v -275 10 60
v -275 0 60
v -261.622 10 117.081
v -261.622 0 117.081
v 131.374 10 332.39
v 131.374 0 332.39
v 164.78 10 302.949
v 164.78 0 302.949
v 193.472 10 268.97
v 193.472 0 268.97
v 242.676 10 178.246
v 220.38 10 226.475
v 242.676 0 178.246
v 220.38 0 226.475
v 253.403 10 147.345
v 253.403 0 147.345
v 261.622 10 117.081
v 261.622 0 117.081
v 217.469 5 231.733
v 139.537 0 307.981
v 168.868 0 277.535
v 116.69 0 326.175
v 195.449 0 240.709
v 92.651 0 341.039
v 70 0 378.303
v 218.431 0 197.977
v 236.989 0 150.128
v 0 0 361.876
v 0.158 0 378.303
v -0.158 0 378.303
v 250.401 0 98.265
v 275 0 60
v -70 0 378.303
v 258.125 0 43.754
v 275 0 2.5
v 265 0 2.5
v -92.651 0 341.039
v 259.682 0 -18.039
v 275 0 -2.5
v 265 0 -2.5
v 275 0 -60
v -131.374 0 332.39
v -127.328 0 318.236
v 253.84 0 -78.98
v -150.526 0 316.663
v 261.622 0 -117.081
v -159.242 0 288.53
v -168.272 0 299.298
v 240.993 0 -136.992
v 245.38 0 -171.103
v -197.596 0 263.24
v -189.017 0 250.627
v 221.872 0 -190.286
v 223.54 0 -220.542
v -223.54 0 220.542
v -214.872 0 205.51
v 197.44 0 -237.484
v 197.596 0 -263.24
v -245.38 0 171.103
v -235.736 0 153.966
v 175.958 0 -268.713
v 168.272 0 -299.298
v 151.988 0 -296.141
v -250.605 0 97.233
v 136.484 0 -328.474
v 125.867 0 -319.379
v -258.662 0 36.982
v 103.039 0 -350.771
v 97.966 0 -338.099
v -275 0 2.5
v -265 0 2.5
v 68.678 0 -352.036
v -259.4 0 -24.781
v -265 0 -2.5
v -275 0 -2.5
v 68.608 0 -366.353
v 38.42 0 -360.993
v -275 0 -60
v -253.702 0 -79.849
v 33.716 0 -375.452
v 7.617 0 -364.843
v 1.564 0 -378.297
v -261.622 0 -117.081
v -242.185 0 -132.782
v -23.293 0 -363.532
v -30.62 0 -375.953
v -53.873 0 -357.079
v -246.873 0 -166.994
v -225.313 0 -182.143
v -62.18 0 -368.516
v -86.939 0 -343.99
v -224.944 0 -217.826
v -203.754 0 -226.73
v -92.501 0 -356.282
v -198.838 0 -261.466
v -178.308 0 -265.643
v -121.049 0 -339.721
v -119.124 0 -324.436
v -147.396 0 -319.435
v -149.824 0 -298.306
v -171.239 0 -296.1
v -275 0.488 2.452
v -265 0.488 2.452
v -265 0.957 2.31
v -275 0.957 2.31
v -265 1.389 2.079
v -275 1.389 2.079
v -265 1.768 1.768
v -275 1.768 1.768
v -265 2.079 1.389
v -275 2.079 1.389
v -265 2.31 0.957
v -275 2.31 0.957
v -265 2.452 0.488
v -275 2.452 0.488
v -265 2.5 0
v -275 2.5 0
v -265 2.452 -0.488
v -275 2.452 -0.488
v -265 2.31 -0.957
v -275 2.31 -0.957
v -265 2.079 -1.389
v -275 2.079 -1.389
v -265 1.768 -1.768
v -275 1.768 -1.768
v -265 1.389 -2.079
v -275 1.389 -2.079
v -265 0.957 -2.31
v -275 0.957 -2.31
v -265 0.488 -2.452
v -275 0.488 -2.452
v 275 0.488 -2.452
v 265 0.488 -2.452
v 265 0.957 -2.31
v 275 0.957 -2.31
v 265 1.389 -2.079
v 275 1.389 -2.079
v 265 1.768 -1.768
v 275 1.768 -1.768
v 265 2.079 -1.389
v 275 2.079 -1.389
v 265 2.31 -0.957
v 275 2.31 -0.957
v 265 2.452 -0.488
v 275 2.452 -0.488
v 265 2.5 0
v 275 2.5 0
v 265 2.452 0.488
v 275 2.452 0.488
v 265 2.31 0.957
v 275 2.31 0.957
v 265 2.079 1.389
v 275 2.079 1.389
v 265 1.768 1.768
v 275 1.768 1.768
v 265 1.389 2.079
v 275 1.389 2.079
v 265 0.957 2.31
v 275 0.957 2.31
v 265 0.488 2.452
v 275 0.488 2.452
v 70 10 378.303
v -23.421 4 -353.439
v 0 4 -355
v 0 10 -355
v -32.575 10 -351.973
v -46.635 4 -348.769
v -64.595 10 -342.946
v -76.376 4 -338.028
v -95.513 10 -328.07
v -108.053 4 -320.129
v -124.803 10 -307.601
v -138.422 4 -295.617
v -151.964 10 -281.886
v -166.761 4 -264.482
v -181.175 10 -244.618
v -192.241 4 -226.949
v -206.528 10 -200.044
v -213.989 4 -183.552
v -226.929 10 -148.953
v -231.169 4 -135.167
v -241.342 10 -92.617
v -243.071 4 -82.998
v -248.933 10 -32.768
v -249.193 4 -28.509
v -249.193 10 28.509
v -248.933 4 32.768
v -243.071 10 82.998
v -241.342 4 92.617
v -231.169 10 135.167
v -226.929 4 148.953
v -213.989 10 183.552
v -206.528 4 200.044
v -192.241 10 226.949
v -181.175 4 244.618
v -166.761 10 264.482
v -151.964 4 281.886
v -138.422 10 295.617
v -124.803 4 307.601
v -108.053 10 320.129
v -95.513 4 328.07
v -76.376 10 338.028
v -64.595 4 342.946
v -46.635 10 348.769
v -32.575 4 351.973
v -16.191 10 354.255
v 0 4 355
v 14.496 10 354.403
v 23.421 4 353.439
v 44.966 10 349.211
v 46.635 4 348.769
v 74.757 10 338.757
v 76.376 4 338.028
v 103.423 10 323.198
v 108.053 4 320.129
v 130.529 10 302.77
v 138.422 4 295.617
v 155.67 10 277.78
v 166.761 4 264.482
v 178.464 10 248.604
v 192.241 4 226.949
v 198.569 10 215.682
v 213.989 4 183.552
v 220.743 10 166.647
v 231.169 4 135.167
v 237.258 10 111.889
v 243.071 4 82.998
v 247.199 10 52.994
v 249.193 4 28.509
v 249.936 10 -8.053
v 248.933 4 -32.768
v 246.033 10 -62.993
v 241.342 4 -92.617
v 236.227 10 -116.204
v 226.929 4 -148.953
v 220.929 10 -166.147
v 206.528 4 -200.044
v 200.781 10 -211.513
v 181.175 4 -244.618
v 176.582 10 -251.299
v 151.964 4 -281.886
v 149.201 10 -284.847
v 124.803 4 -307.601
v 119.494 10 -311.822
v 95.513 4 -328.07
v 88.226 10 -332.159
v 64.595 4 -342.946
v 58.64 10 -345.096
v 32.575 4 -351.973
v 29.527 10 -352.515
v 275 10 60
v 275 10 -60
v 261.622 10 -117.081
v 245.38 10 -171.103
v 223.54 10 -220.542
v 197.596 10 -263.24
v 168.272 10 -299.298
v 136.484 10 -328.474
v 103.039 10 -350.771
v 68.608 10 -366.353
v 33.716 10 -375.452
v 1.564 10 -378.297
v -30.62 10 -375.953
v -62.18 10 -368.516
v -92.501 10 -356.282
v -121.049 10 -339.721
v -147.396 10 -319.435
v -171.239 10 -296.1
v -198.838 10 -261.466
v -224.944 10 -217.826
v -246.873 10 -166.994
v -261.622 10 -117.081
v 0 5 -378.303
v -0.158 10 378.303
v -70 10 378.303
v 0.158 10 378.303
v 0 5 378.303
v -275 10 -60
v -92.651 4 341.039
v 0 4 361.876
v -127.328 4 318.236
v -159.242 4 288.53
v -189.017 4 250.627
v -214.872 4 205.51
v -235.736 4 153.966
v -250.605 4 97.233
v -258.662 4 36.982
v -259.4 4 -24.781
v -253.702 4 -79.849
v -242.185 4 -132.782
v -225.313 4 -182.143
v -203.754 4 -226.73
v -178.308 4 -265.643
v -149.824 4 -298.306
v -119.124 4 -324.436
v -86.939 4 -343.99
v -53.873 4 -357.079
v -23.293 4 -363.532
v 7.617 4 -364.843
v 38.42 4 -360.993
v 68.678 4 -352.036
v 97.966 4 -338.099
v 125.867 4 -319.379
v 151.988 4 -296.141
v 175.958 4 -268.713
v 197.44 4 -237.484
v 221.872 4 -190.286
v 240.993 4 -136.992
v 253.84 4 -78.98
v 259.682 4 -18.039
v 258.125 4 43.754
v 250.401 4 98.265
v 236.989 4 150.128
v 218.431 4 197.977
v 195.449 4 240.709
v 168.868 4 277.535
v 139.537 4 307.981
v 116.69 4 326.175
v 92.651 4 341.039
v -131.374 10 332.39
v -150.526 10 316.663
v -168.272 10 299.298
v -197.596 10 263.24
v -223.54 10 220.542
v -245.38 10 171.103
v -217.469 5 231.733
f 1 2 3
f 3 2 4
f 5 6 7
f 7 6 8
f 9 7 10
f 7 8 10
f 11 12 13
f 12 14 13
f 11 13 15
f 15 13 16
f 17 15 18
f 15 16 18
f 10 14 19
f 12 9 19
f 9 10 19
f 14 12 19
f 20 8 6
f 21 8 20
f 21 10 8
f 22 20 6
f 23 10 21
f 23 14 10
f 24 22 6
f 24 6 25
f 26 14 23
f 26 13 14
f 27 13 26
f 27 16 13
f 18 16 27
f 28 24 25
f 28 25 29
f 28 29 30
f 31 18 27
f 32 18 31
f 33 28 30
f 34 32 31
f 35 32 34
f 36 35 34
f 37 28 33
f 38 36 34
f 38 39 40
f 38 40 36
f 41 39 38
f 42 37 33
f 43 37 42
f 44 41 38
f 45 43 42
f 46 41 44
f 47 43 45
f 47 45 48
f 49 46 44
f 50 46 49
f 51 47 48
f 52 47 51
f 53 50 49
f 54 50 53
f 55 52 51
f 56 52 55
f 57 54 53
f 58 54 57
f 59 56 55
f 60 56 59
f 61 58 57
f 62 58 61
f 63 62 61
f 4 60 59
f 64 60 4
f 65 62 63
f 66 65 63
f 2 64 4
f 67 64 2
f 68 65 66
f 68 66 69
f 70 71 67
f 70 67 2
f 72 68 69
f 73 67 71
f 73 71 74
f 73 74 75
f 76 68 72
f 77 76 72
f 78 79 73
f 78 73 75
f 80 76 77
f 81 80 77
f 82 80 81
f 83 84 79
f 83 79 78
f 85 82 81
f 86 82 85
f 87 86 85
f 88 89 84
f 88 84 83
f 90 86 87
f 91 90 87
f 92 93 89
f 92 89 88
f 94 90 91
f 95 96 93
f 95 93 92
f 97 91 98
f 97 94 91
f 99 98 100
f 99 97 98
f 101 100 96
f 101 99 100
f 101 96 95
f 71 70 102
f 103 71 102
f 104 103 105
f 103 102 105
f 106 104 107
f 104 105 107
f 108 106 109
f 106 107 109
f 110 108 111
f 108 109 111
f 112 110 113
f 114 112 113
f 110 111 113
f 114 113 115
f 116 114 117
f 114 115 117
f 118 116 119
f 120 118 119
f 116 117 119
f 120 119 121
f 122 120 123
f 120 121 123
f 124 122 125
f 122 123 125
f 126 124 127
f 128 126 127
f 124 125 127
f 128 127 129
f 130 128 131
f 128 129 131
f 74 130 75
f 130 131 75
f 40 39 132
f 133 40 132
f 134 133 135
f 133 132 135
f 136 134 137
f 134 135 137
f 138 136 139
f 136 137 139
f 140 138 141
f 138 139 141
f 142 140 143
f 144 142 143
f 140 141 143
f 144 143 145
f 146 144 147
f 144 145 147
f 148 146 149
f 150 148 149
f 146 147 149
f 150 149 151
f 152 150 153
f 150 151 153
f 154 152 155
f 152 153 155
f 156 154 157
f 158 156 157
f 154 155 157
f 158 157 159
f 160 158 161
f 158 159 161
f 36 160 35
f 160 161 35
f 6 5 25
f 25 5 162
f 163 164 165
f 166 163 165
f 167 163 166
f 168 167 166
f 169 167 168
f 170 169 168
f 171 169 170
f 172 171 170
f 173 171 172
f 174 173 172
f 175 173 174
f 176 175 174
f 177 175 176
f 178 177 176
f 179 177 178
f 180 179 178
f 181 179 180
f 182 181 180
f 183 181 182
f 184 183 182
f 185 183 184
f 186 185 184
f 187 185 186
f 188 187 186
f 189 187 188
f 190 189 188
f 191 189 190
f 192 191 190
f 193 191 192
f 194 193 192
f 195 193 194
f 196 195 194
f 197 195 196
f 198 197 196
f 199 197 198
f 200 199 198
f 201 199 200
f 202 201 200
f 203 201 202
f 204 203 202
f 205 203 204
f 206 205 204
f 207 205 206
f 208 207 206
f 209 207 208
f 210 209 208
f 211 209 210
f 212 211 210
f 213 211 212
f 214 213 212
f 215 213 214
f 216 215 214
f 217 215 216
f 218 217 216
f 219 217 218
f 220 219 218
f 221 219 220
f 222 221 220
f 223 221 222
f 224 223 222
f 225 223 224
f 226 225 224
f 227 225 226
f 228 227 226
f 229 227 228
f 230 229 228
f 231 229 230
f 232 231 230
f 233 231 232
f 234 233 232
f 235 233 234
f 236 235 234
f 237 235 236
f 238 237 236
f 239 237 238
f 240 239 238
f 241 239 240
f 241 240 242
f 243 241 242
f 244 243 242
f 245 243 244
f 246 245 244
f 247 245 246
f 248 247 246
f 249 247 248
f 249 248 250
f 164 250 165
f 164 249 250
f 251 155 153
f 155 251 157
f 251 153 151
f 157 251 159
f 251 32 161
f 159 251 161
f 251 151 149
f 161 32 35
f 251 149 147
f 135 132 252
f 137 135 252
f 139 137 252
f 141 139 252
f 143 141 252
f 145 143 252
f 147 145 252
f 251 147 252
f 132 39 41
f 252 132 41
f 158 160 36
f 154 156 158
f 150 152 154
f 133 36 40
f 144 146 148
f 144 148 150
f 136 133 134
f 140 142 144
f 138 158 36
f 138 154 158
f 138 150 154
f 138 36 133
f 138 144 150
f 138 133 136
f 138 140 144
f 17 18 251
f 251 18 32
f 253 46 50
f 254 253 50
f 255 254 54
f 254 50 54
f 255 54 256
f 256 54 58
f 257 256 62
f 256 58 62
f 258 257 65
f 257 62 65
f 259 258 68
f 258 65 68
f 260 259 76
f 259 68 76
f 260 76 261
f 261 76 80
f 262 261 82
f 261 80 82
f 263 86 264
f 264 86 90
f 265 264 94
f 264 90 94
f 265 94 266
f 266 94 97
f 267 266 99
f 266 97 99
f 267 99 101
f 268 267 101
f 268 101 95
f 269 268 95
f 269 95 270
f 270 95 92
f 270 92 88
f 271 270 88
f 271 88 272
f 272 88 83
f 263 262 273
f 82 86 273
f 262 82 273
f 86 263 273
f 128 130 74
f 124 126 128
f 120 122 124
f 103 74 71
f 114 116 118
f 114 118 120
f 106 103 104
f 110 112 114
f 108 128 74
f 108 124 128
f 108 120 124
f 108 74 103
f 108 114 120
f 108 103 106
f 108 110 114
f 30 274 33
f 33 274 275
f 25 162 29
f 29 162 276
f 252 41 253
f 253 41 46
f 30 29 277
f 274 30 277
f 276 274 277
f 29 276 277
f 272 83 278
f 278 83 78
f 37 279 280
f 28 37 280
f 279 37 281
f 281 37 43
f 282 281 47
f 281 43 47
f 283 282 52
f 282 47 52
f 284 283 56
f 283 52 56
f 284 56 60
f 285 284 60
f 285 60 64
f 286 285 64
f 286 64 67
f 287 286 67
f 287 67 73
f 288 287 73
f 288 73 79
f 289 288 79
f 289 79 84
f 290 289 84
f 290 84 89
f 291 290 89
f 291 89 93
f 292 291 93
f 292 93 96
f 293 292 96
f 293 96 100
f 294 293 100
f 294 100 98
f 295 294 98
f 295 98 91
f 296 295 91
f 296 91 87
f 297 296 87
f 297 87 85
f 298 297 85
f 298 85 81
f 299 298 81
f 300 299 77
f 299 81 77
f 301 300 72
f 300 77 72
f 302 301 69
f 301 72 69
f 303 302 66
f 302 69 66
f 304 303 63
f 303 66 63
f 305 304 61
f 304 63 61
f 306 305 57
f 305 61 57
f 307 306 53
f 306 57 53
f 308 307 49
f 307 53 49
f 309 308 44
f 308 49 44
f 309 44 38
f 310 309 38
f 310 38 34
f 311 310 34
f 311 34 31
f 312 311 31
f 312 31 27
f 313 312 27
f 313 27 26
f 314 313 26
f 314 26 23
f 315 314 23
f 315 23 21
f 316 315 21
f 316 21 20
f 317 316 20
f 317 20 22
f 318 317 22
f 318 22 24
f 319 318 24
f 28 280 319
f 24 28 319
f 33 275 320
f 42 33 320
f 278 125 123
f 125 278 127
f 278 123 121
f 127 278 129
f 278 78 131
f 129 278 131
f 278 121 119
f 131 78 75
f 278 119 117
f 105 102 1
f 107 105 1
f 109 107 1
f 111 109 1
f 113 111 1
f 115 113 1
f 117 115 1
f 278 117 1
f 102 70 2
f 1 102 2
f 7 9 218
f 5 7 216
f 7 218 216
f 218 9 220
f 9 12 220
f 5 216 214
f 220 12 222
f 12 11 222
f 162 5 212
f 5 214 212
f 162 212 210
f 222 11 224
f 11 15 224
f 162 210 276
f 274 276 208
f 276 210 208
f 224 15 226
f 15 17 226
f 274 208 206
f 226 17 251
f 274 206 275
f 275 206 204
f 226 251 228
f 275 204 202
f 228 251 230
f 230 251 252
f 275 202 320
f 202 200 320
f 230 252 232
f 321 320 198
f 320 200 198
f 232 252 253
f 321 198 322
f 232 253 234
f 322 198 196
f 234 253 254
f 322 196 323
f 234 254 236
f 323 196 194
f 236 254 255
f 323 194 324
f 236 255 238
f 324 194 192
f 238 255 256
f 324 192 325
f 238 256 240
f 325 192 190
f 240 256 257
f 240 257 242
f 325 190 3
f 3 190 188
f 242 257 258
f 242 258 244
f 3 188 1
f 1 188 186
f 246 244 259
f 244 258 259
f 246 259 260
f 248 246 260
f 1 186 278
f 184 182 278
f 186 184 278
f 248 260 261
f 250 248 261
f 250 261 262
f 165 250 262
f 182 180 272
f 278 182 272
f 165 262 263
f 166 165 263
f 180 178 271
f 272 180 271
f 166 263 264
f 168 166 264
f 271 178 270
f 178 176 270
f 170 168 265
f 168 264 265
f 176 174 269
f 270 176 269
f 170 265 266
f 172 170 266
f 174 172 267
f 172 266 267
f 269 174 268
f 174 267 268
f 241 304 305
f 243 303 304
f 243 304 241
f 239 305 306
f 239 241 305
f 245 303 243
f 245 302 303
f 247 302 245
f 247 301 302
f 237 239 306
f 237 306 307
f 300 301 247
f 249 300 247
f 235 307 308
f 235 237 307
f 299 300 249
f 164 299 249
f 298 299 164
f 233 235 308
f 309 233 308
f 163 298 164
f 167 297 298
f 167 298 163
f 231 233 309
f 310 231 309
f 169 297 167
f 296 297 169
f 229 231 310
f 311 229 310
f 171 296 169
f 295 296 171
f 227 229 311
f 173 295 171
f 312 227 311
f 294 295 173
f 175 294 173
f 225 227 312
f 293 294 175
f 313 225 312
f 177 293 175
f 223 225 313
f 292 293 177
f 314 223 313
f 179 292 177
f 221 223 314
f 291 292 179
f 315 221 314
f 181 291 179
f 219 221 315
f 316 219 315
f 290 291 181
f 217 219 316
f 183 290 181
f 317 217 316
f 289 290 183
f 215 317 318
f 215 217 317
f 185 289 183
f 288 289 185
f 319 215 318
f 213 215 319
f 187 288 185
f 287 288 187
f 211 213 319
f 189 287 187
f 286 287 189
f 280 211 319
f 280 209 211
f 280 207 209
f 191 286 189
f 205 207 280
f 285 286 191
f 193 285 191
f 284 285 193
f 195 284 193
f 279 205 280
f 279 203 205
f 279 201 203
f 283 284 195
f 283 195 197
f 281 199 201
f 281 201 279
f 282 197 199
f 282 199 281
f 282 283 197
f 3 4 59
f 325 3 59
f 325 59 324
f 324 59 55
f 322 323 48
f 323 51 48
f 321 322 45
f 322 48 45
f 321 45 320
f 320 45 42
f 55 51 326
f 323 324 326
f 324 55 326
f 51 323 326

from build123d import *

# Parameters (mm, degrees)
SKETCH1_RX          = 355
SKETCH1_RY          = 250
BOSS_EXTRUDE1_DEPTH = 10
SKETCH2_RX          = 365
SKETCH2_RY          = 260
SKETCH2_RX_2        = 355
SKETCH2_RY_2        = 250
CUT_EXTRUDE1_DEPTH  = 4
BOSS_EXTRUDE2_DEPTH = 10
CUT_EXTRUDE4_DEPTH  = 10
CUT_EXTRUDE5_DEPTH  = 10


with BuildPart() as part:
    # Sketch1 → Boss-Extrude1 (new body)
    with BuildSketch(Plane(origin=(0, 0, 0), x_dir=(1, 0, 0), z_dir=(0, 1, 0))):
        with BuildLine():
            Line((-275, 60), (-275, -60))
            Line((-275, -60), (-261.621622, -117.081081))
            add(Edge.make_bspline(
                [(-261.621622, -117.081081), (0, -1222.344863), (261.621622, -117.081081)],
                knots=[5.027046, 5.027046, 5.027046, 7.539325, 7.539325, 7.539325], degree=2, weights=[1, 0.30949, 1]))
            Line((261.621622, -117.081081), (275, -60))
            Line((275, -60), (275, 60))
            Line((275, 60), (261.621622, 117.081081))
            add(Edge.make_bspline(
                [(261.621622, 117.081081), (0, 1222.344863), (-261.621622, 117.081081)],
                knots=[5.027046, 5.027046, 5.027046, 7.539325, 7.539325, 7.539325], degree=2, weights=[1, 0.30949, 1]))
            Line((-261.621622, 117.081081), (-275, 60))
        make_face()
        with Locations(Location((0, 0), (0, 0, 90))):
            Ellipse(SKETCH1_RX, SKETCH1_RY, mode=Mode.SUBTRACT)
    extrude(amount=BOSS_EXTRUDE1_DEPTH)

    # Sketch2 → Cut-Extrude1 (cut)
    with BuildSketch(Plane.XZ):
        with Locations(Location((0, 0), (0, 0, 90))):
            Ellipse(SKETCH2_RX, SKETCH2_RY)
        with Locations(Location((0, 0), (0, 0, 90))):
            Ellipse(SKETCH2_RX_2, SKETCH2_RY_2, mode=Mode.SUBTRACT)
    extrude(amount=-CUT_EXTRUDE1_DEPTH, mode=Mode.SUBTRACT)

    # Sketch3 → Boss-Extrude2 (add)
    with BuildSketch(Plane(origin=(0, 10, 0), x_dir=(1, 0, 0), z_dir=(0, 1, 0))):
        Polygon((70, -378.303394), (-70, -378.303394), (-131.488451, -332.304138), (0, -361.875658), (131.488451, -332.304138), align=None)
    extrude(amount=-BOSS_EXTRUDE2_DEPTH)

    # Sketch4 → Cut-Extrude4 (cut)
    with BuildSketch(Plane.ZY.offset(275)):
        with BuildLine():
            Line((-2.5, 0), (2.5, 0))
            ThreePointArc((2.5, 0), (0, 2.5), (-2.5, 0))
        make_face()
    extrude(amount=-CUT_EXTRUDE4_DEPTH, mode=Mode.SUBTRACT)

    # Sketch5 → Cut-Extrude5 (cut)
    with BuildSketch(Plane(origin=(275, 0, 0), x_dir=(0, 0, -1), z_dir=(1, 0, 0))):
        with BuildLine():
            Line((-2.5, 0), (2.5, 0))
            ThreePointArc((2.5, 0), (0, 2.5), (-2.5, 0))
        make_face()
    extrude(amount=-CUT_EXTRUDE5_DEPTH, mode=Mode.SUBTRACT)


solid = part.part
